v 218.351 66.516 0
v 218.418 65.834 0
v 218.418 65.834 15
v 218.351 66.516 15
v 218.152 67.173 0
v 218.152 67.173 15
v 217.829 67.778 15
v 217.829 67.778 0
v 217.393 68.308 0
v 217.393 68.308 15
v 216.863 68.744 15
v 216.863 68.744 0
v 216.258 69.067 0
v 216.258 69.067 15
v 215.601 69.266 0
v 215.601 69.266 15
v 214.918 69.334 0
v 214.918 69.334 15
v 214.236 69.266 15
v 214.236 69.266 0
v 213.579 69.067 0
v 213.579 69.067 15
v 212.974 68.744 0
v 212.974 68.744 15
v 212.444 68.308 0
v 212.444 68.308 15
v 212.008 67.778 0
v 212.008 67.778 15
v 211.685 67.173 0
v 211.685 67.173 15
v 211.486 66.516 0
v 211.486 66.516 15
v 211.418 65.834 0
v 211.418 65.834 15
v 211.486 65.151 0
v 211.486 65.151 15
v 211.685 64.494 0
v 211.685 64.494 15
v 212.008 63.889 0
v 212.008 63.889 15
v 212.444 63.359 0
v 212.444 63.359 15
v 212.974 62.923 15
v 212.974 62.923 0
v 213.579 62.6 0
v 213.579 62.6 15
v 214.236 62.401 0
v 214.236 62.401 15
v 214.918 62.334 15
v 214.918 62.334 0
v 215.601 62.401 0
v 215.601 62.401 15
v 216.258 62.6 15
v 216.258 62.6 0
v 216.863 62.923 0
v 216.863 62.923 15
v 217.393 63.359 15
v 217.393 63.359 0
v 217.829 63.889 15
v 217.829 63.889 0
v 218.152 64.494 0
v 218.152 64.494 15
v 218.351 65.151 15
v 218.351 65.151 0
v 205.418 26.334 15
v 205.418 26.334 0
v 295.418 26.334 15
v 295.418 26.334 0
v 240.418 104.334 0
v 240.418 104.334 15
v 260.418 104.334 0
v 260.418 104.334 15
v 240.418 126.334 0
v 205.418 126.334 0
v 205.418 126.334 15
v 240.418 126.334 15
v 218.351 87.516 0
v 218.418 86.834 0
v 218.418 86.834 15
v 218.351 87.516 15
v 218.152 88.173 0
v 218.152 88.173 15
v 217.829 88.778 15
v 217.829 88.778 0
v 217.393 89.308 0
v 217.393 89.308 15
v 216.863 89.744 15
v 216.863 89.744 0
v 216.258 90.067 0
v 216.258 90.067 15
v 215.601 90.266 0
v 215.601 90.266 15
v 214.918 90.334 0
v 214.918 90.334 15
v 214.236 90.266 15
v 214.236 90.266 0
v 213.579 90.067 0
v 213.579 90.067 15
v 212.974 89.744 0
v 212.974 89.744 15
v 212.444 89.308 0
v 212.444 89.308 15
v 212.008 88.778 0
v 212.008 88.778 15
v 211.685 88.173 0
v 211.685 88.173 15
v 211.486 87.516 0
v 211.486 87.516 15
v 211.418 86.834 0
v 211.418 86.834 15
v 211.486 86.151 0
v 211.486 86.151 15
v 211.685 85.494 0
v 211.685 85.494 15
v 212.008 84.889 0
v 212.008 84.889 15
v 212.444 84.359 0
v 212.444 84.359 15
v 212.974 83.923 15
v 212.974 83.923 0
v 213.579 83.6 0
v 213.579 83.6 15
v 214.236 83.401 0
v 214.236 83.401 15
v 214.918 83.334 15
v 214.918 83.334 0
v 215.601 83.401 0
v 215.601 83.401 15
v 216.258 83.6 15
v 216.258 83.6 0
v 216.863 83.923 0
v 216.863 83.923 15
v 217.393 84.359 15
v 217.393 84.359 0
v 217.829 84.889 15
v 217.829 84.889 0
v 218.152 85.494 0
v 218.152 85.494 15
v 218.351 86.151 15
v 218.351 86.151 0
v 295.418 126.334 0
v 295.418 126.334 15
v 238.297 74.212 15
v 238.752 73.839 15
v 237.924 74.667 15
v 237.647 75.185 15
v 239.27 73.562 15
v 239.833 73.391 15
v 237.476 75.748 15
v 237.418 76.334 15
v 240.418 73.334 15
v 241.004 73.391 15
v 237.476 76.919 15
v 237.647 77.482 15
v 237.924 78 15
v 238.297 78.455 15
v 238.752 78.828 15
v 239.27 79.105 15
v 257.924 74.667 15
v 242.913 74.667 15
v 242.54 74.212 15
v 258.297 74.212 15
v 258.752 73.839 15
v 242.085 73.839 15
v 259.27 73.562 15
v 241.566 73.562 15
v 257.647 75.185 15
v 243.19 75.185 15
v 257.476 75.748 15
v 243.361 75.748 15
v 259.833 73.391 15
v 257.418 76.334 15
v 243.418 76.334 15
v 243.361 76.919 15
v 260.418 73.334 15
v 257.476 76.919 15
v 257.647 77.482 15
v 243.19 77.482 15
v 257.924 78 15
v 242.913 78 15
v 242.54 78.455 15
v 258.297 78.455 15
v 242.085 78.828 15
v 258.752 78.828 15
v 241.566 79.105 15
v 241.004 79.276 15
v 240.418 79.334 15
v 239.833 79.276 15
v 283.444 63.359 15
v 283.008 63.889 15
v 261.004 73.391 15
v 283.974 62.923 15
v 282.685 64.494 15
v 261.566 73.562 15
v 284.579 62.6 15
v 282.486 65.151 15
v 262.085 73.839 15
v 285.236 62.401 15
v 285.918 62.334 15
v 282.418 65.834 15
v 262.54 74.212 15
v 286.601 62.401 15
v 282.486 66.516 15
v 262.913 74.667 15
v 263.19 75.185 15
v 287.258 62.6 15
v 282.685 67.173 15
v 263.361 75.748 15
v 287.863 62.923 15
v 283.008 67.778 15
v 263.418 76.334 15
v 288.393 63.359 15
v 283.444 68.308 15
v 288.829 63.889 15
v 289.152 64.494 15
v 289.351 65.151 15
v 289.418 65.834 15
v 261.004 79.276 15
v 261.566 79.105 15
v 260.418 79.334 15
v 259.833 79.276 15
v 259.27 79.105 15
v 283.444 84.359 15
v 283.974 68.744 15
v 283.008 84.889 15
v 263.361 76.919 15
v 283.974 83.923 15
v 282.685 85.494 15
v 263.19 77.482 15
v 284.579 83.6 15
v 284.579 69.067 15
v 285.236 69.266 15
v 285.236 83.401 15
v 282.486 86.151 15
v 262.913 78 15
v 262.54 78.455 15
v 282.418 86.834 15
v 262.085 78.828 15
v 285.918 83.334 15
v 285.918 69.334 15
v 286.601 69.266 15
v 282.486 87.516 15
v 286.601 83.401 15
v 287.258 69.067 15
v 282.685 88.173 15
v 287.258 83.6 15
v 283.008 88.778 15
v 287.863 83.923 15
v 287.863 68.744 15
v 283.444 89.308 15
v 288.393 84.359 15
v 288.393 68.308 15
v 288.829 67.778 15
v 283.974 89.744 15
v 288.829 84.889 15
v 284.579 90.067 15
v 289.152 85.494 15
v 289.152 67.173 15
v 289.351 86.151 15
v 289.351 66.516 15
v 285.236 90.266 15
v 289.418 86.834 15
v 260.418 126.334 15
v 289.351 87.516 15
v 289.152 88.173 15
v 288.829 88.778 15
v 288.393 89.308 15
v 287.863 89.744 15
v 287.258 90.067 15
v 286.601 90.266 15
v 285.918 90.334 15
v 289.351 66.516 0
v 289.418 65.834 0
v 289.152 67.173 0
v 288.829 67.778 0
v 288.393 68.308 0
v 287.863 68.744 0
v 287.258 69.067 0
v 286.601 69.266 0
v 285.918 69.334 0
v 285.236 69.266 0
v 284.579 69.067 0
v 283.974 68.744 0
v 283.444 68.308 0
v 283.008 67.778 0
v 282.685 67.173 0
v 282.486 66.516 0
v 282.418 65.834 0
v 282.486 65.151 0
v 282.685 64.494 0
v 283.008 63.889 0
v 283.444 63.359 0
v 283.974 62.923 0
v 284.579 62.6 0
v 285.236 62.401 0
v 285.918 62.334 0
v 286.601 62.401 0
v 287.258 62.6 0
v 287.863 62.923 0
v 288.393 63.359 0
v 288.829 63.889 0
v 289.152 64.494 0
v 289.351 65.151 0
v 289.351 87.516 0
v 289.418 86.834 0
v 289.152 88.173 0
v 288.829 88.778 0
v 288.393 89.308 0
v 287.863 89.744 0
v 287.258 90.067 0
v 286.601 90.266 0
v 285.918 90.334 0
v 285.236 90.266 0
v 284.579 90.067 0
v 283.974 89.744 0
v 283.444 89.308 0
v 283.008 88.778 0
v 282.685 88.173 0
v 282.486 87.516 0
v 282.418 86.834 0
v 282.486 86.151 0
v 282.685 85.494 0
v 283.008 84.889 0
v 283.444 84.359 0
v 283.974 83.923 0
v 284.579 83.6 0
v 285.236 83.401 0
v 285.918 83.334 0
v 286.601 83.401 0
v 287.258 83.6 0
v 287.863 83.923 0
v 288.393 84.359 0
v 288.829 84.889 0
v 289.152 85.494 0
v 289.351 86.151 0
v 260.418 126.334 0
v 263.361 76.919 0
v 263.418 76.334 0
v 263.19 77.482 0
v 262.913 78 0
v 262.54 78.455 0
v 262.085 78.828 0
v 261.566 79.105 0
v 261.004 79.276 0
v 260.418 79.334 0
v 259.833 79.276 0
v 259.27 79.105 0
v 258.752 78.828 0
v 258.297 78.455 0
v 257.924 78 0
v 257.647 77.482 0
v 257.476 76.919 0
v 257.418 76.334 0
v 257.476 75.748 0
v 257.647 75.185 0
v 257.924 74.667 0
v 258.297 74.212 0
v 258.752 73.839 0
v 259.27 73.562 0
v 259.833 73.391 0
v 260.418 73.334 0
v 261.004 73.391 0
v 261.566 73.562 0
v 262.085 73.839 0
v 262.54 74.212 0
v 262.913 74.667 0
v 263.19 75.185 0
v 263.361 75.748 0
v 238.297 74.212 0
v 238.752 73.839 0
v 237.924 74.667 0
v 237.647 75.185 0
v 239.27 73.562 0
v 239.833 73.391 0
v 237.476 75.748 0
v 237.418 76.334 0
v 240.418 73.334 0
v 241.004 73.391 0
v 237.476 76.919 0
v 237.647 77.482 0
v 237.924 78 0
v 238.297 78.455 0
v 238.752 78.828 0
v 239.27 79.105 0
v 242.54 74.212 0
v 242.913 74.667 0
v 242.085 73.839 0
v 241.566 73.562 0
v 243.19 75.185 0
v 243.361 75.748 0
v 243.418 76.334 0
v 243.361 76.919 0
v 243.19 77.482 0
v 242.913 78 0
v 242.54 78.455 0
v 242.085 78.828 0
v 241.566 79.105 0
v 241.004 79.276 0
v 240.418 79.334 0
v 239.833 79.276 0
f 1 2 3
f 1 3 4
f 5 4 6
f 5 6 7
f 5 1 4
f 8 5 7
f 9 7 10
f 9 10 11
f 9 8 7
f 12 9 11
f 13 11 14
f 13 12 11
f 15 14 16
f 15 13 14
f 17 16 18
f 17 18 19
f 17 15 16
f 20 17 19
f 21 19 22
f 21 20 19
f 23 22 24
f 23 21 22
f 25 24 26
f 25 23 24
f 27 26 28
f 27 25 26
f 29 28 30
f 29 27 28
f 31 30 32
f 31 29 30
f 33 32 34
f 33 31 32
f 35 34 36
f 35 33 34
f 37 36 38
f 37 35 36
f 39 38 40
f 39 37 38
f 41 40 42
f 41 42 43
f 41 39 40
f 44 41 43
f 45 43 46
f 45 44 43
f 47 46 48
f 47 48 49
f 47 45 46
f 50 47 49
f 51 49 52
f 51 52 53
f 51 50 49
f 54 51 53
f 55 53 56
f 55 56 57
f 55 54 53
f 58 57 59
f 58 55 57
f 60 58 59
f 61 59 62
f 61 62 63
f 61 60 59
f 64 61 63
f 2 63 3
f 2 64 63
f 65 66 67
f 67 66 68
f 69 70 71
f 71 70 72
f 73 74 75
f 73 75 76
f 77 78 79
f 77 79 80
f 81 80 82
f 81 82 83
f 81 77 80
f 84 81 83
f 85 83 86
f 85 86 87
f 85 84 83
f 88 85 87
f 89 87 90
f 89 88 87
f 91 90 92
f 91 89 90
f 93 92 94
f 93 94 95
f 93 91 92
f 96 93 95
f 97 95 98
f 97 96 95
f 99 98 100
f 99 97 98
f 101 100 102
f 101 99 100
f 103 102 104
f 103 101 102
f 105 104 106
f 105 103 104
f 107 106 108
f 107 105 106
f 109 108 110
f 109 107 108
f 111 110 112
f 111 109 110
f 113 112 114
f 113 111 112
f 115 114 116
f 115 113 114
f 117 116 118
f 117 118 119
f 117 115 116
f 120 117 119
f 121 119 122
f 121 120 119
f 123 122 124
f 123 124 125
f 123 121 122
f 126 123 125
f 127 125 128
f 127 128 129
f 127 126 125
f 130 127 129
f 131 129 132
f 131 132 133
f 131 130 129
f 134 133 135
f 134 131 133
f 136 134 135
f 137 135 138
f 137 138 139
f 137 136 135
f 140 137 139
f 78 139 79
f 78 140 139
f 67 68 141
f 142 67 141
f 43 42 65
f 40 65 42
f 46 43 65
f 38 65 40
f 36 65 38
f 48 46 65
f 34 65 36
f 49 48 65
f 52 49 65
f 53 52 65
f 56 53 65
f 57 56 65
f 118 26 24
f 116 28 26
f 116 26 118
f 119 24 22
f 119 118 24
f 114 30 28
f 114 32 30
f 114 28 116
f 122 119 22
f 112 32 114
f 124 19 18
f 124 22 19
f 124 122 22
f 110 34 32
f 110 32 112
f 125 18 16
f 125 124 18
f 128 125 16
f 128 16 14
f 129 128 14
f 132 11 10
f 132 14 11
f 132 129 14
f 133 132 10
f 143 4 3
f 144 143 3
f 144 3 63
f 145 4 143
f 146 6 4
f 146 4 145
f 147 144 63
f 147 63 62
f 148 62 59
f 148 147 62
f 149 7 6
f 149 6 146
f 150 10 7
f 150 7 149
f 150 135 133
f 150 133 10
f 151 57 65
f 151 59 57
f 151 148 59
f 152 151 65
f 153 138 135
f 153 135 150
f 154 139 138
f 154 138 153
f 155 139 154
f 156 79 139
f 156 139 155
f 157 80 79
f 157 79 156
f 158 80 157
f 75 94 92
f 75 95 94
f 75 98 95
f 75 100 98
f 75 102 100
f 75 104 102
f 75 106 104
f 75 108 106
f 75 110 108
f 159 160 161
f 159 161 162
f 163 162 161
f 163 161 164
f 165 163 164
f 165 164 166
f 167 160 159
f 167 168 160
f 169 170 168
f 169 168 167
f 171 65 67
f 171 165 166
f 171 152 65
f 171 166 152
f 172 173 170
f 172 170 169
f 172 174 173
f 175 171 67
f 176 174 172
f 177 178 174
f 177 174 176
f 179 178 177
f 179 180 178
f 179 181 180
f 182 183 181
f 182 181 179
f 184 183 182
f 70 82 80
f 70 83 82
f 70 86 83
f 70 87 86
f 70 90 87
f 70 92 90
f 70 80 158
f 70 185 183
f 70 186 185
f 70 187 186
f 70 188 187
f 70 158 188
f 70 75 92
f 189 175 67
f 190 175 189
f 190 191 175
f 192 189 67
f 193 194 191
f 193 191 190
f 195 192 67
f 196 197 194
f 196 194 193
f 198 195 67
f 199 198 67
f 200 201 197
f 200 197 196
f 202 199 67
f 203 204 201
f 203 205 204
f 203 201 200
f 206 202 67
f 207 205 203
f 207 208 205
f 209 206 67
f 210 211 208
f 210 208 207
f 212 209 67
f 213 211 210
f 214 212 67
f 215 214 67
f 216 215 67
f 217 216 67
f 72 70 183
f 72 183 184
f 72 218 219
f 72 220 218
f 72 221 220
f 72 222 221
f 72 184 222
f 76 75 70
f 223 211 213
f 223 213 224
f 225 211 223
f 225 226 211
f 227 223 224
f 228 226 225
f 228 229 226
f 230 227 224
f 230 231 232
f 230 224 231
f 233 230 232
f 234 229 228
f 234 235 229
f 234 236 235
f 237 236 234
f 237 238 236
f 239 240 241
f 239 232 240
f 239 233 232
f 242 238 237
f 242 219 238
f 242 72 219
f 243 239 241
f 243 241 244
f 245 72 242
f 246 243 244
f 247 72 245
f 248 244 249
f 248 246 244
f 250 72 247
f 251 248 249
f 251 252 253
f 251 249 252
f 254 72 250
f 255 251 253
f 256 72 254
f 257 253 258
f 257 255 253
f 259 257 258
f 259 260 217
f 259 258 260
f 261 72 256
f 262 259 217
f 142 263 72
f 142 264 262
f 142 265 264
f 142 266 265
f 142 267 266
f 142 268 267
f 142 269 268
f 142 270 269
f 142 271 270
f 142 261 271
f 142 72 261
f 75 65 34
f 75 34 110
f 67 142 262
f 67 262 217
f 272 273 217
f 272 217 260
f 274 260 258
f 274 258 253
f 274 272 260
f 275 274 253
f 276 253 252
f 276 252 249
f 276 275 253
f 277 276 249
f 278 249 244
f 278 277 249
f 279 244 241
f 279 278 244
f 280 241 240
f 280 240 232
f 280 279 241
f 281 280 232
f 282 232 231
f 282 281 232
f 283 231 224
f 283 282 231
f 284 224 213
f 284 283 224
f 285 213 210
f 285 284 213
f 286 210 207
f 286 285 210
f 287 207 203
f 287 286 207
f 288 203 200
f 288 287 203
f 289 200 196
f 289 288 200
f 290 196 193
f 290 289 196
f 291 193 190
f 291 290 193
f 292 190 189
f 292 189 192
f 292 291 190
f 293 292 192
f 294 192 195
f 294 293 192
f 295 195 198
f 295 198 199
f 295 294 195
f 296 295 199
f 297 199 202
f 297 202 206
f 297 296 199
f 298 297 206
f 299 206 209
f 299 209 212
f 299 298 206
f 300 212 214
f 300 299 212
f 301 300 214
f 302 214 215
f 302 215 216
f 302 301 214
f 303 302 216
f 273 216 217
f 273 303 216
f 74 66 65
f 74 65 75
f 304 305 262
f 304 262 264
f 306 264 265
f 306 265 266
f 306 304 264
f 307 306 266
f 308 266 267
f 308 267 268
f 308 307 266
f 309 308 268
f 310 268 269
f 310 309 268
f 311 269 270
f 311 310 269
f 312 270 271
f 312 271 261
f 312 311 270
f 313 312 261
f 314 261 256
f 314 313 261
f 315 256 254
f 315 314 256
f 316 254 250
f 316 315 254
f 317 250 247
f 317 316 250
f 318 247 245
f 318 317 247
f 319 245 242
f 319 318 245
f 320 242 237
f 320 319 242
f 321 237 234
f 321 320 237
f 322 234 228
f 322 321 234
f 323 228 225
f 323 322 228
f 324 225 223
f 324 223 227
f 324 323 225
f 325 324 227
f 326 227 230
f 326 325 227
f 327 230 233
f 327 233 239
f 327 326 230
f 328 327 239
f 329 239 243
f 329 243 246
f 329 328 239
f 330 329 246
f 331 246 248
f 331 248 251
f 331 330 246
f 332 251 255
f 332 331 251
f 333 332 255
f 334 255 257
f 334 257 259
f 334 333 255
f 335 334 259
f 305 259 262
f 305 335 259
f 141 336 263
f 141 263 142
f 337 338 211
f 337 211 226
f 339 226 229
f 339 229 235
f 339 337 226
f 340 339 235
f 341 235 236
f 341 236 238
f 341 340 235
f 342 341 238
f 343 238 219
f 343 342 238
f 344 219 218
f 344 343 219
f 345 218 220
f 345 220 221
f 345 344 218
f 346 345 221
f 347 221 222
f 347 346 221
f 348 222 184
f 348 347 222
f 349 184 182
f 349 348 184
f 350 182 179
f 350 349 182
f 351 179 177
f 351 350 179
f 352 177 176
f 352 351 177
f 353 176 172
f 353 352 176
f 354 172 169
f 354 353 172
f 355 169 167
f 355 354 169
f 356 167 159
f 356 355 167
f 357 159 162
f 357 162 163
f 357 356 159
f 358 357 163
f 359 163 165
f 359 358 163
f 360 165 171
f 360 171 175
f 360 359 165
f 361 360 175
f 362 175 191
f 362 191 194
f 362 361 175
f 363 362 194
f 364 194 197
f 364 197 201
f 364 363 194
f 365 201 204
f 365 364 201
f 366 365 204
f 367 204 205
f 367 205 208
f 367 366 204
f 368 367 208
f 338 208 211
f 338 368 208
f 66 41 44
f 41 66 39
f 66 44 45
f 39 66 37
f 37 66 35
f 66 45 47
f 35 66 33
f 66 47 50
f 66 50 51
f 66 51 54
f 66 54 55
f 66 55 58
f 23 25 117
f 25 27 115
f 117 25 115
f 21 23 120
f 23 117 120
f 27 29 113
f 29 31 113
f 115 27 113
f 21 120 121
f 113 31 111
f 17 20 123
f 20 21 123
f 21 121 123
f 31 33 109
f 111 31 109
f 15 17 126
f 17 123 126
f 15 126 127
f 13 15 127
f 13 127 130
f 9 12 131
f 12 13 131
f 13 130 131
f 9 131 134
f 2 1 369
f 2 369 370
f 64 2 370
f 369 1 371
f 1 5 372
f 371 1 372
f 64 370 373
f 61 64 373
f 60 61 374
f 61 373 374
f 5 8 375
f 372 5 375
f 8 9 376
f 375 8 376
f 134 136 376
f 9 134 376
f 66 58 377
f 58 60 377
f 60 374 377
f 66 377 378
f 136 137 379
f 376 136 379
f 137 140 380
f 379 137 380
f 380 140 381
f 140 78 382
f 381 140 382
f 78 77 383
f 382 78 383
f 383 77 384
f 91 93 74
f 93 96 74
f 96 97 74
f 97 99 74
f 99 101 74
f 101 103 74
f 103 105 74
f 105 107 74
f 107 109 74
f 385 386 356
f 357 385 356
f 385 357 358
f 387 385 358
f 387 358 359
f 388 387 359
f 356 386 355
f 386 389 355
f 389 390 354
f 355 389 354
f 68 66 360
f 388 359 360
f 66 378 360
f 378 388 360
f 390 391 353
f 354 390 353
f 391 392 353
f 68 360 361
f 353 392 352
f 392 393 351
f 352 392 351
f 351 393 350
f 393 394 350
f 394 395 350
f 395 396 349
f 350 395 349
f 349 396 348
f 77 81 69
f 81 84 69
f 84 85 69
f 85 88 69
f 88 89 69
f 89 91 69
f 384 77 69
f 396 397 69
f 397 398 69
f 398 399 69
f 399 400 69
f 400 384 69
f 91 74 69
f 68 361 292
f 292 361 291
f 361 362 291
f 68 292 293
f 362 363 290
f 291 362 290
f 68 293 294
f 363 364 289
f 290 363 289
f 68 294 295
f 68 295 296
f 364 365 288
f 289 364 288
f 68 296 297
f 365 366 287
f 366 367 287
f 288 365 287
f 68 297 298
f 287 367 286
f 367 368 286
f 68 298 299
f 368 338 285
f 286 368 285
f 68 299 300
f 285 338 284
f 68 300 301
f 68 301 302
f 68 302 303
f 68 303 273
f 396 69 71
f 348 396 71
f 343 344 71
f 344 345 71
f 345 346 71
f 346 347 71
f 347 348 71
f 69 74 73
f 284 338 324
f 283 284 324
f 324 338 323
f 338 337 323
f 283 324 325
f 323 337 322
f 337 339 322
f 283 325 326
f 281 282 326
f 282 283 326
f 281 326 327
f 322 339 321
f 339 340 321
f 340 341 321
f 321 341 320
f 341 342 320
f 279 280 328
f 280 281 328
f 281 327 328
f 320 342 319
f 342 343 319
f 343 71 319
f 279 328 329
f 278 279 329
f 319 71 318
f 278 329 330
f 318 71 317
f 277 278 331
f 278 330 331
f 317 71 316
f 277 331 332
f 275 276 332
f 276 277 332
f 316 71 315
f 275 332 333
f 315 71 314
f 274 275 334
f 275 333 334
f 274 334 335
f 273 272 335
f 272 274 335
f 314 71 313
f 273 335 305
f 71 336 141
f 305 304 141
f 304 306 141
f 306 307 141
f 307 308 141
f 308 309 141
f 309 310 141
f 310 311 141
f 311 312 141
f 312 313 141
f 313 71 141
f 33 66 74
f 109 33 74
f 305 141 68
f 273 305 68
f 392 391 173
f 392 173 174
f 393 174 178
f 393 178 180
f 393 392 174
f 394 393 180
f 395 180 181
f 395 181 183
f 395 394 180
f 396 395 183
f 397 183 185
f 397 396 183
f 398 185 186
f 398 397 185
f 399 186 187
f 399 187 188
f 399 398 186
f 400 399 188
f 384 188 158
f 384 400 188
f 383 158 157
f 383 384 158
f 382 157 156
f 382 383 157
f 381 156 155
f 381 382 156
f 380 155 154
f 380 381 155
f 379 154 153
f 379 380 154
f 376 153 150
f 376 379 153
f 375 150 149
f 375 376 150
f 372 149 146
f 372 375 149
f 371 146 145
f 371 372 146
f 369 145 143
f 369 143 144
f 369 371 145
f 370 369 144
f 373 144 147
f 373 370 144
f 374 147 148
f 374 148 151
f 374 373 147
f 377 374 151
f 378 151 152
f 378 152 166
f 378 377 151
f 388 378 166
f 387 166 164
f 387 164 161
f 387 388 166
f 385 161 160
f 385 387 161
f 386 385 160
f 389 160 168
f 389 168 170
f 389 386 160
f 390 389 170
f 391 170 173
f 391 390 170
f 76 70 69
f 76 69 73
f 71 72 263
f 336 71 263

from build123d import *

# Parameters (mm, degrees)
SKETCH1_W           = 90
SKETCH1_H           = 100
SKETCH1_R           = 3
SKETCH1_R_2         = 3.5
BOSS_EXTRUDE1_DEPTH = 15
SKETCH2_W           = 20
SKETCH2_H           = 22
CUT_EXTRUDE1_DEPTH  = 15


with BuildPart() as part:
    # Sketch1 → Boss-Extrude1 (new body)
    with BuildSketch(Plane.XY):
        with Locations((250.418436726, 76.333548914)):
            Rectangle(SKETCH1_W, SKETCH1_H)
        with Locations((260.418436726, 76.333548914)):
            Circle(SKETCH1_R, mode=Mode.SUBTRACT)
        with Locations((240.418436726, 76.333548914)):
            Circle(SKETCH1_R, mode=Mode.SUBTRACT)
        with Locations((214.918436726, 86.833548914)):
            Circle(SKETCH1_R_2, mode=Mode.SUBTRACT)
        with Locations((214.918436726, 65.833548914)):
            Circle(SKETCH1_R_2, mode=Mode.SUBTRACT)
        with Locations((285.918436726, 86.833548914)):
            Circle(SKETCH1_R_2, mode=Mode.SUBTRACT)
        with Locations((285.918436726, 65.833548914)):
            Circle(SKETCH1_R_2, mode=Mode.SUBTRACT)
    extrude(amount=BOSS_EXTRUDE1_DEPTH)

    # Sketch2 → Cut-Extrude1 (cut)
    with BuildSketch(Plane.XY.offset(15)):
        with Locations((250.418436726, 115.333548914)):
            Rectangle(SKETCH2_W, SKETCH2_H)
    extrude(amount=-CUT_EXTRUDE1_DEPTH, mode=Mode.SUBTRACT)


solid = part.part
